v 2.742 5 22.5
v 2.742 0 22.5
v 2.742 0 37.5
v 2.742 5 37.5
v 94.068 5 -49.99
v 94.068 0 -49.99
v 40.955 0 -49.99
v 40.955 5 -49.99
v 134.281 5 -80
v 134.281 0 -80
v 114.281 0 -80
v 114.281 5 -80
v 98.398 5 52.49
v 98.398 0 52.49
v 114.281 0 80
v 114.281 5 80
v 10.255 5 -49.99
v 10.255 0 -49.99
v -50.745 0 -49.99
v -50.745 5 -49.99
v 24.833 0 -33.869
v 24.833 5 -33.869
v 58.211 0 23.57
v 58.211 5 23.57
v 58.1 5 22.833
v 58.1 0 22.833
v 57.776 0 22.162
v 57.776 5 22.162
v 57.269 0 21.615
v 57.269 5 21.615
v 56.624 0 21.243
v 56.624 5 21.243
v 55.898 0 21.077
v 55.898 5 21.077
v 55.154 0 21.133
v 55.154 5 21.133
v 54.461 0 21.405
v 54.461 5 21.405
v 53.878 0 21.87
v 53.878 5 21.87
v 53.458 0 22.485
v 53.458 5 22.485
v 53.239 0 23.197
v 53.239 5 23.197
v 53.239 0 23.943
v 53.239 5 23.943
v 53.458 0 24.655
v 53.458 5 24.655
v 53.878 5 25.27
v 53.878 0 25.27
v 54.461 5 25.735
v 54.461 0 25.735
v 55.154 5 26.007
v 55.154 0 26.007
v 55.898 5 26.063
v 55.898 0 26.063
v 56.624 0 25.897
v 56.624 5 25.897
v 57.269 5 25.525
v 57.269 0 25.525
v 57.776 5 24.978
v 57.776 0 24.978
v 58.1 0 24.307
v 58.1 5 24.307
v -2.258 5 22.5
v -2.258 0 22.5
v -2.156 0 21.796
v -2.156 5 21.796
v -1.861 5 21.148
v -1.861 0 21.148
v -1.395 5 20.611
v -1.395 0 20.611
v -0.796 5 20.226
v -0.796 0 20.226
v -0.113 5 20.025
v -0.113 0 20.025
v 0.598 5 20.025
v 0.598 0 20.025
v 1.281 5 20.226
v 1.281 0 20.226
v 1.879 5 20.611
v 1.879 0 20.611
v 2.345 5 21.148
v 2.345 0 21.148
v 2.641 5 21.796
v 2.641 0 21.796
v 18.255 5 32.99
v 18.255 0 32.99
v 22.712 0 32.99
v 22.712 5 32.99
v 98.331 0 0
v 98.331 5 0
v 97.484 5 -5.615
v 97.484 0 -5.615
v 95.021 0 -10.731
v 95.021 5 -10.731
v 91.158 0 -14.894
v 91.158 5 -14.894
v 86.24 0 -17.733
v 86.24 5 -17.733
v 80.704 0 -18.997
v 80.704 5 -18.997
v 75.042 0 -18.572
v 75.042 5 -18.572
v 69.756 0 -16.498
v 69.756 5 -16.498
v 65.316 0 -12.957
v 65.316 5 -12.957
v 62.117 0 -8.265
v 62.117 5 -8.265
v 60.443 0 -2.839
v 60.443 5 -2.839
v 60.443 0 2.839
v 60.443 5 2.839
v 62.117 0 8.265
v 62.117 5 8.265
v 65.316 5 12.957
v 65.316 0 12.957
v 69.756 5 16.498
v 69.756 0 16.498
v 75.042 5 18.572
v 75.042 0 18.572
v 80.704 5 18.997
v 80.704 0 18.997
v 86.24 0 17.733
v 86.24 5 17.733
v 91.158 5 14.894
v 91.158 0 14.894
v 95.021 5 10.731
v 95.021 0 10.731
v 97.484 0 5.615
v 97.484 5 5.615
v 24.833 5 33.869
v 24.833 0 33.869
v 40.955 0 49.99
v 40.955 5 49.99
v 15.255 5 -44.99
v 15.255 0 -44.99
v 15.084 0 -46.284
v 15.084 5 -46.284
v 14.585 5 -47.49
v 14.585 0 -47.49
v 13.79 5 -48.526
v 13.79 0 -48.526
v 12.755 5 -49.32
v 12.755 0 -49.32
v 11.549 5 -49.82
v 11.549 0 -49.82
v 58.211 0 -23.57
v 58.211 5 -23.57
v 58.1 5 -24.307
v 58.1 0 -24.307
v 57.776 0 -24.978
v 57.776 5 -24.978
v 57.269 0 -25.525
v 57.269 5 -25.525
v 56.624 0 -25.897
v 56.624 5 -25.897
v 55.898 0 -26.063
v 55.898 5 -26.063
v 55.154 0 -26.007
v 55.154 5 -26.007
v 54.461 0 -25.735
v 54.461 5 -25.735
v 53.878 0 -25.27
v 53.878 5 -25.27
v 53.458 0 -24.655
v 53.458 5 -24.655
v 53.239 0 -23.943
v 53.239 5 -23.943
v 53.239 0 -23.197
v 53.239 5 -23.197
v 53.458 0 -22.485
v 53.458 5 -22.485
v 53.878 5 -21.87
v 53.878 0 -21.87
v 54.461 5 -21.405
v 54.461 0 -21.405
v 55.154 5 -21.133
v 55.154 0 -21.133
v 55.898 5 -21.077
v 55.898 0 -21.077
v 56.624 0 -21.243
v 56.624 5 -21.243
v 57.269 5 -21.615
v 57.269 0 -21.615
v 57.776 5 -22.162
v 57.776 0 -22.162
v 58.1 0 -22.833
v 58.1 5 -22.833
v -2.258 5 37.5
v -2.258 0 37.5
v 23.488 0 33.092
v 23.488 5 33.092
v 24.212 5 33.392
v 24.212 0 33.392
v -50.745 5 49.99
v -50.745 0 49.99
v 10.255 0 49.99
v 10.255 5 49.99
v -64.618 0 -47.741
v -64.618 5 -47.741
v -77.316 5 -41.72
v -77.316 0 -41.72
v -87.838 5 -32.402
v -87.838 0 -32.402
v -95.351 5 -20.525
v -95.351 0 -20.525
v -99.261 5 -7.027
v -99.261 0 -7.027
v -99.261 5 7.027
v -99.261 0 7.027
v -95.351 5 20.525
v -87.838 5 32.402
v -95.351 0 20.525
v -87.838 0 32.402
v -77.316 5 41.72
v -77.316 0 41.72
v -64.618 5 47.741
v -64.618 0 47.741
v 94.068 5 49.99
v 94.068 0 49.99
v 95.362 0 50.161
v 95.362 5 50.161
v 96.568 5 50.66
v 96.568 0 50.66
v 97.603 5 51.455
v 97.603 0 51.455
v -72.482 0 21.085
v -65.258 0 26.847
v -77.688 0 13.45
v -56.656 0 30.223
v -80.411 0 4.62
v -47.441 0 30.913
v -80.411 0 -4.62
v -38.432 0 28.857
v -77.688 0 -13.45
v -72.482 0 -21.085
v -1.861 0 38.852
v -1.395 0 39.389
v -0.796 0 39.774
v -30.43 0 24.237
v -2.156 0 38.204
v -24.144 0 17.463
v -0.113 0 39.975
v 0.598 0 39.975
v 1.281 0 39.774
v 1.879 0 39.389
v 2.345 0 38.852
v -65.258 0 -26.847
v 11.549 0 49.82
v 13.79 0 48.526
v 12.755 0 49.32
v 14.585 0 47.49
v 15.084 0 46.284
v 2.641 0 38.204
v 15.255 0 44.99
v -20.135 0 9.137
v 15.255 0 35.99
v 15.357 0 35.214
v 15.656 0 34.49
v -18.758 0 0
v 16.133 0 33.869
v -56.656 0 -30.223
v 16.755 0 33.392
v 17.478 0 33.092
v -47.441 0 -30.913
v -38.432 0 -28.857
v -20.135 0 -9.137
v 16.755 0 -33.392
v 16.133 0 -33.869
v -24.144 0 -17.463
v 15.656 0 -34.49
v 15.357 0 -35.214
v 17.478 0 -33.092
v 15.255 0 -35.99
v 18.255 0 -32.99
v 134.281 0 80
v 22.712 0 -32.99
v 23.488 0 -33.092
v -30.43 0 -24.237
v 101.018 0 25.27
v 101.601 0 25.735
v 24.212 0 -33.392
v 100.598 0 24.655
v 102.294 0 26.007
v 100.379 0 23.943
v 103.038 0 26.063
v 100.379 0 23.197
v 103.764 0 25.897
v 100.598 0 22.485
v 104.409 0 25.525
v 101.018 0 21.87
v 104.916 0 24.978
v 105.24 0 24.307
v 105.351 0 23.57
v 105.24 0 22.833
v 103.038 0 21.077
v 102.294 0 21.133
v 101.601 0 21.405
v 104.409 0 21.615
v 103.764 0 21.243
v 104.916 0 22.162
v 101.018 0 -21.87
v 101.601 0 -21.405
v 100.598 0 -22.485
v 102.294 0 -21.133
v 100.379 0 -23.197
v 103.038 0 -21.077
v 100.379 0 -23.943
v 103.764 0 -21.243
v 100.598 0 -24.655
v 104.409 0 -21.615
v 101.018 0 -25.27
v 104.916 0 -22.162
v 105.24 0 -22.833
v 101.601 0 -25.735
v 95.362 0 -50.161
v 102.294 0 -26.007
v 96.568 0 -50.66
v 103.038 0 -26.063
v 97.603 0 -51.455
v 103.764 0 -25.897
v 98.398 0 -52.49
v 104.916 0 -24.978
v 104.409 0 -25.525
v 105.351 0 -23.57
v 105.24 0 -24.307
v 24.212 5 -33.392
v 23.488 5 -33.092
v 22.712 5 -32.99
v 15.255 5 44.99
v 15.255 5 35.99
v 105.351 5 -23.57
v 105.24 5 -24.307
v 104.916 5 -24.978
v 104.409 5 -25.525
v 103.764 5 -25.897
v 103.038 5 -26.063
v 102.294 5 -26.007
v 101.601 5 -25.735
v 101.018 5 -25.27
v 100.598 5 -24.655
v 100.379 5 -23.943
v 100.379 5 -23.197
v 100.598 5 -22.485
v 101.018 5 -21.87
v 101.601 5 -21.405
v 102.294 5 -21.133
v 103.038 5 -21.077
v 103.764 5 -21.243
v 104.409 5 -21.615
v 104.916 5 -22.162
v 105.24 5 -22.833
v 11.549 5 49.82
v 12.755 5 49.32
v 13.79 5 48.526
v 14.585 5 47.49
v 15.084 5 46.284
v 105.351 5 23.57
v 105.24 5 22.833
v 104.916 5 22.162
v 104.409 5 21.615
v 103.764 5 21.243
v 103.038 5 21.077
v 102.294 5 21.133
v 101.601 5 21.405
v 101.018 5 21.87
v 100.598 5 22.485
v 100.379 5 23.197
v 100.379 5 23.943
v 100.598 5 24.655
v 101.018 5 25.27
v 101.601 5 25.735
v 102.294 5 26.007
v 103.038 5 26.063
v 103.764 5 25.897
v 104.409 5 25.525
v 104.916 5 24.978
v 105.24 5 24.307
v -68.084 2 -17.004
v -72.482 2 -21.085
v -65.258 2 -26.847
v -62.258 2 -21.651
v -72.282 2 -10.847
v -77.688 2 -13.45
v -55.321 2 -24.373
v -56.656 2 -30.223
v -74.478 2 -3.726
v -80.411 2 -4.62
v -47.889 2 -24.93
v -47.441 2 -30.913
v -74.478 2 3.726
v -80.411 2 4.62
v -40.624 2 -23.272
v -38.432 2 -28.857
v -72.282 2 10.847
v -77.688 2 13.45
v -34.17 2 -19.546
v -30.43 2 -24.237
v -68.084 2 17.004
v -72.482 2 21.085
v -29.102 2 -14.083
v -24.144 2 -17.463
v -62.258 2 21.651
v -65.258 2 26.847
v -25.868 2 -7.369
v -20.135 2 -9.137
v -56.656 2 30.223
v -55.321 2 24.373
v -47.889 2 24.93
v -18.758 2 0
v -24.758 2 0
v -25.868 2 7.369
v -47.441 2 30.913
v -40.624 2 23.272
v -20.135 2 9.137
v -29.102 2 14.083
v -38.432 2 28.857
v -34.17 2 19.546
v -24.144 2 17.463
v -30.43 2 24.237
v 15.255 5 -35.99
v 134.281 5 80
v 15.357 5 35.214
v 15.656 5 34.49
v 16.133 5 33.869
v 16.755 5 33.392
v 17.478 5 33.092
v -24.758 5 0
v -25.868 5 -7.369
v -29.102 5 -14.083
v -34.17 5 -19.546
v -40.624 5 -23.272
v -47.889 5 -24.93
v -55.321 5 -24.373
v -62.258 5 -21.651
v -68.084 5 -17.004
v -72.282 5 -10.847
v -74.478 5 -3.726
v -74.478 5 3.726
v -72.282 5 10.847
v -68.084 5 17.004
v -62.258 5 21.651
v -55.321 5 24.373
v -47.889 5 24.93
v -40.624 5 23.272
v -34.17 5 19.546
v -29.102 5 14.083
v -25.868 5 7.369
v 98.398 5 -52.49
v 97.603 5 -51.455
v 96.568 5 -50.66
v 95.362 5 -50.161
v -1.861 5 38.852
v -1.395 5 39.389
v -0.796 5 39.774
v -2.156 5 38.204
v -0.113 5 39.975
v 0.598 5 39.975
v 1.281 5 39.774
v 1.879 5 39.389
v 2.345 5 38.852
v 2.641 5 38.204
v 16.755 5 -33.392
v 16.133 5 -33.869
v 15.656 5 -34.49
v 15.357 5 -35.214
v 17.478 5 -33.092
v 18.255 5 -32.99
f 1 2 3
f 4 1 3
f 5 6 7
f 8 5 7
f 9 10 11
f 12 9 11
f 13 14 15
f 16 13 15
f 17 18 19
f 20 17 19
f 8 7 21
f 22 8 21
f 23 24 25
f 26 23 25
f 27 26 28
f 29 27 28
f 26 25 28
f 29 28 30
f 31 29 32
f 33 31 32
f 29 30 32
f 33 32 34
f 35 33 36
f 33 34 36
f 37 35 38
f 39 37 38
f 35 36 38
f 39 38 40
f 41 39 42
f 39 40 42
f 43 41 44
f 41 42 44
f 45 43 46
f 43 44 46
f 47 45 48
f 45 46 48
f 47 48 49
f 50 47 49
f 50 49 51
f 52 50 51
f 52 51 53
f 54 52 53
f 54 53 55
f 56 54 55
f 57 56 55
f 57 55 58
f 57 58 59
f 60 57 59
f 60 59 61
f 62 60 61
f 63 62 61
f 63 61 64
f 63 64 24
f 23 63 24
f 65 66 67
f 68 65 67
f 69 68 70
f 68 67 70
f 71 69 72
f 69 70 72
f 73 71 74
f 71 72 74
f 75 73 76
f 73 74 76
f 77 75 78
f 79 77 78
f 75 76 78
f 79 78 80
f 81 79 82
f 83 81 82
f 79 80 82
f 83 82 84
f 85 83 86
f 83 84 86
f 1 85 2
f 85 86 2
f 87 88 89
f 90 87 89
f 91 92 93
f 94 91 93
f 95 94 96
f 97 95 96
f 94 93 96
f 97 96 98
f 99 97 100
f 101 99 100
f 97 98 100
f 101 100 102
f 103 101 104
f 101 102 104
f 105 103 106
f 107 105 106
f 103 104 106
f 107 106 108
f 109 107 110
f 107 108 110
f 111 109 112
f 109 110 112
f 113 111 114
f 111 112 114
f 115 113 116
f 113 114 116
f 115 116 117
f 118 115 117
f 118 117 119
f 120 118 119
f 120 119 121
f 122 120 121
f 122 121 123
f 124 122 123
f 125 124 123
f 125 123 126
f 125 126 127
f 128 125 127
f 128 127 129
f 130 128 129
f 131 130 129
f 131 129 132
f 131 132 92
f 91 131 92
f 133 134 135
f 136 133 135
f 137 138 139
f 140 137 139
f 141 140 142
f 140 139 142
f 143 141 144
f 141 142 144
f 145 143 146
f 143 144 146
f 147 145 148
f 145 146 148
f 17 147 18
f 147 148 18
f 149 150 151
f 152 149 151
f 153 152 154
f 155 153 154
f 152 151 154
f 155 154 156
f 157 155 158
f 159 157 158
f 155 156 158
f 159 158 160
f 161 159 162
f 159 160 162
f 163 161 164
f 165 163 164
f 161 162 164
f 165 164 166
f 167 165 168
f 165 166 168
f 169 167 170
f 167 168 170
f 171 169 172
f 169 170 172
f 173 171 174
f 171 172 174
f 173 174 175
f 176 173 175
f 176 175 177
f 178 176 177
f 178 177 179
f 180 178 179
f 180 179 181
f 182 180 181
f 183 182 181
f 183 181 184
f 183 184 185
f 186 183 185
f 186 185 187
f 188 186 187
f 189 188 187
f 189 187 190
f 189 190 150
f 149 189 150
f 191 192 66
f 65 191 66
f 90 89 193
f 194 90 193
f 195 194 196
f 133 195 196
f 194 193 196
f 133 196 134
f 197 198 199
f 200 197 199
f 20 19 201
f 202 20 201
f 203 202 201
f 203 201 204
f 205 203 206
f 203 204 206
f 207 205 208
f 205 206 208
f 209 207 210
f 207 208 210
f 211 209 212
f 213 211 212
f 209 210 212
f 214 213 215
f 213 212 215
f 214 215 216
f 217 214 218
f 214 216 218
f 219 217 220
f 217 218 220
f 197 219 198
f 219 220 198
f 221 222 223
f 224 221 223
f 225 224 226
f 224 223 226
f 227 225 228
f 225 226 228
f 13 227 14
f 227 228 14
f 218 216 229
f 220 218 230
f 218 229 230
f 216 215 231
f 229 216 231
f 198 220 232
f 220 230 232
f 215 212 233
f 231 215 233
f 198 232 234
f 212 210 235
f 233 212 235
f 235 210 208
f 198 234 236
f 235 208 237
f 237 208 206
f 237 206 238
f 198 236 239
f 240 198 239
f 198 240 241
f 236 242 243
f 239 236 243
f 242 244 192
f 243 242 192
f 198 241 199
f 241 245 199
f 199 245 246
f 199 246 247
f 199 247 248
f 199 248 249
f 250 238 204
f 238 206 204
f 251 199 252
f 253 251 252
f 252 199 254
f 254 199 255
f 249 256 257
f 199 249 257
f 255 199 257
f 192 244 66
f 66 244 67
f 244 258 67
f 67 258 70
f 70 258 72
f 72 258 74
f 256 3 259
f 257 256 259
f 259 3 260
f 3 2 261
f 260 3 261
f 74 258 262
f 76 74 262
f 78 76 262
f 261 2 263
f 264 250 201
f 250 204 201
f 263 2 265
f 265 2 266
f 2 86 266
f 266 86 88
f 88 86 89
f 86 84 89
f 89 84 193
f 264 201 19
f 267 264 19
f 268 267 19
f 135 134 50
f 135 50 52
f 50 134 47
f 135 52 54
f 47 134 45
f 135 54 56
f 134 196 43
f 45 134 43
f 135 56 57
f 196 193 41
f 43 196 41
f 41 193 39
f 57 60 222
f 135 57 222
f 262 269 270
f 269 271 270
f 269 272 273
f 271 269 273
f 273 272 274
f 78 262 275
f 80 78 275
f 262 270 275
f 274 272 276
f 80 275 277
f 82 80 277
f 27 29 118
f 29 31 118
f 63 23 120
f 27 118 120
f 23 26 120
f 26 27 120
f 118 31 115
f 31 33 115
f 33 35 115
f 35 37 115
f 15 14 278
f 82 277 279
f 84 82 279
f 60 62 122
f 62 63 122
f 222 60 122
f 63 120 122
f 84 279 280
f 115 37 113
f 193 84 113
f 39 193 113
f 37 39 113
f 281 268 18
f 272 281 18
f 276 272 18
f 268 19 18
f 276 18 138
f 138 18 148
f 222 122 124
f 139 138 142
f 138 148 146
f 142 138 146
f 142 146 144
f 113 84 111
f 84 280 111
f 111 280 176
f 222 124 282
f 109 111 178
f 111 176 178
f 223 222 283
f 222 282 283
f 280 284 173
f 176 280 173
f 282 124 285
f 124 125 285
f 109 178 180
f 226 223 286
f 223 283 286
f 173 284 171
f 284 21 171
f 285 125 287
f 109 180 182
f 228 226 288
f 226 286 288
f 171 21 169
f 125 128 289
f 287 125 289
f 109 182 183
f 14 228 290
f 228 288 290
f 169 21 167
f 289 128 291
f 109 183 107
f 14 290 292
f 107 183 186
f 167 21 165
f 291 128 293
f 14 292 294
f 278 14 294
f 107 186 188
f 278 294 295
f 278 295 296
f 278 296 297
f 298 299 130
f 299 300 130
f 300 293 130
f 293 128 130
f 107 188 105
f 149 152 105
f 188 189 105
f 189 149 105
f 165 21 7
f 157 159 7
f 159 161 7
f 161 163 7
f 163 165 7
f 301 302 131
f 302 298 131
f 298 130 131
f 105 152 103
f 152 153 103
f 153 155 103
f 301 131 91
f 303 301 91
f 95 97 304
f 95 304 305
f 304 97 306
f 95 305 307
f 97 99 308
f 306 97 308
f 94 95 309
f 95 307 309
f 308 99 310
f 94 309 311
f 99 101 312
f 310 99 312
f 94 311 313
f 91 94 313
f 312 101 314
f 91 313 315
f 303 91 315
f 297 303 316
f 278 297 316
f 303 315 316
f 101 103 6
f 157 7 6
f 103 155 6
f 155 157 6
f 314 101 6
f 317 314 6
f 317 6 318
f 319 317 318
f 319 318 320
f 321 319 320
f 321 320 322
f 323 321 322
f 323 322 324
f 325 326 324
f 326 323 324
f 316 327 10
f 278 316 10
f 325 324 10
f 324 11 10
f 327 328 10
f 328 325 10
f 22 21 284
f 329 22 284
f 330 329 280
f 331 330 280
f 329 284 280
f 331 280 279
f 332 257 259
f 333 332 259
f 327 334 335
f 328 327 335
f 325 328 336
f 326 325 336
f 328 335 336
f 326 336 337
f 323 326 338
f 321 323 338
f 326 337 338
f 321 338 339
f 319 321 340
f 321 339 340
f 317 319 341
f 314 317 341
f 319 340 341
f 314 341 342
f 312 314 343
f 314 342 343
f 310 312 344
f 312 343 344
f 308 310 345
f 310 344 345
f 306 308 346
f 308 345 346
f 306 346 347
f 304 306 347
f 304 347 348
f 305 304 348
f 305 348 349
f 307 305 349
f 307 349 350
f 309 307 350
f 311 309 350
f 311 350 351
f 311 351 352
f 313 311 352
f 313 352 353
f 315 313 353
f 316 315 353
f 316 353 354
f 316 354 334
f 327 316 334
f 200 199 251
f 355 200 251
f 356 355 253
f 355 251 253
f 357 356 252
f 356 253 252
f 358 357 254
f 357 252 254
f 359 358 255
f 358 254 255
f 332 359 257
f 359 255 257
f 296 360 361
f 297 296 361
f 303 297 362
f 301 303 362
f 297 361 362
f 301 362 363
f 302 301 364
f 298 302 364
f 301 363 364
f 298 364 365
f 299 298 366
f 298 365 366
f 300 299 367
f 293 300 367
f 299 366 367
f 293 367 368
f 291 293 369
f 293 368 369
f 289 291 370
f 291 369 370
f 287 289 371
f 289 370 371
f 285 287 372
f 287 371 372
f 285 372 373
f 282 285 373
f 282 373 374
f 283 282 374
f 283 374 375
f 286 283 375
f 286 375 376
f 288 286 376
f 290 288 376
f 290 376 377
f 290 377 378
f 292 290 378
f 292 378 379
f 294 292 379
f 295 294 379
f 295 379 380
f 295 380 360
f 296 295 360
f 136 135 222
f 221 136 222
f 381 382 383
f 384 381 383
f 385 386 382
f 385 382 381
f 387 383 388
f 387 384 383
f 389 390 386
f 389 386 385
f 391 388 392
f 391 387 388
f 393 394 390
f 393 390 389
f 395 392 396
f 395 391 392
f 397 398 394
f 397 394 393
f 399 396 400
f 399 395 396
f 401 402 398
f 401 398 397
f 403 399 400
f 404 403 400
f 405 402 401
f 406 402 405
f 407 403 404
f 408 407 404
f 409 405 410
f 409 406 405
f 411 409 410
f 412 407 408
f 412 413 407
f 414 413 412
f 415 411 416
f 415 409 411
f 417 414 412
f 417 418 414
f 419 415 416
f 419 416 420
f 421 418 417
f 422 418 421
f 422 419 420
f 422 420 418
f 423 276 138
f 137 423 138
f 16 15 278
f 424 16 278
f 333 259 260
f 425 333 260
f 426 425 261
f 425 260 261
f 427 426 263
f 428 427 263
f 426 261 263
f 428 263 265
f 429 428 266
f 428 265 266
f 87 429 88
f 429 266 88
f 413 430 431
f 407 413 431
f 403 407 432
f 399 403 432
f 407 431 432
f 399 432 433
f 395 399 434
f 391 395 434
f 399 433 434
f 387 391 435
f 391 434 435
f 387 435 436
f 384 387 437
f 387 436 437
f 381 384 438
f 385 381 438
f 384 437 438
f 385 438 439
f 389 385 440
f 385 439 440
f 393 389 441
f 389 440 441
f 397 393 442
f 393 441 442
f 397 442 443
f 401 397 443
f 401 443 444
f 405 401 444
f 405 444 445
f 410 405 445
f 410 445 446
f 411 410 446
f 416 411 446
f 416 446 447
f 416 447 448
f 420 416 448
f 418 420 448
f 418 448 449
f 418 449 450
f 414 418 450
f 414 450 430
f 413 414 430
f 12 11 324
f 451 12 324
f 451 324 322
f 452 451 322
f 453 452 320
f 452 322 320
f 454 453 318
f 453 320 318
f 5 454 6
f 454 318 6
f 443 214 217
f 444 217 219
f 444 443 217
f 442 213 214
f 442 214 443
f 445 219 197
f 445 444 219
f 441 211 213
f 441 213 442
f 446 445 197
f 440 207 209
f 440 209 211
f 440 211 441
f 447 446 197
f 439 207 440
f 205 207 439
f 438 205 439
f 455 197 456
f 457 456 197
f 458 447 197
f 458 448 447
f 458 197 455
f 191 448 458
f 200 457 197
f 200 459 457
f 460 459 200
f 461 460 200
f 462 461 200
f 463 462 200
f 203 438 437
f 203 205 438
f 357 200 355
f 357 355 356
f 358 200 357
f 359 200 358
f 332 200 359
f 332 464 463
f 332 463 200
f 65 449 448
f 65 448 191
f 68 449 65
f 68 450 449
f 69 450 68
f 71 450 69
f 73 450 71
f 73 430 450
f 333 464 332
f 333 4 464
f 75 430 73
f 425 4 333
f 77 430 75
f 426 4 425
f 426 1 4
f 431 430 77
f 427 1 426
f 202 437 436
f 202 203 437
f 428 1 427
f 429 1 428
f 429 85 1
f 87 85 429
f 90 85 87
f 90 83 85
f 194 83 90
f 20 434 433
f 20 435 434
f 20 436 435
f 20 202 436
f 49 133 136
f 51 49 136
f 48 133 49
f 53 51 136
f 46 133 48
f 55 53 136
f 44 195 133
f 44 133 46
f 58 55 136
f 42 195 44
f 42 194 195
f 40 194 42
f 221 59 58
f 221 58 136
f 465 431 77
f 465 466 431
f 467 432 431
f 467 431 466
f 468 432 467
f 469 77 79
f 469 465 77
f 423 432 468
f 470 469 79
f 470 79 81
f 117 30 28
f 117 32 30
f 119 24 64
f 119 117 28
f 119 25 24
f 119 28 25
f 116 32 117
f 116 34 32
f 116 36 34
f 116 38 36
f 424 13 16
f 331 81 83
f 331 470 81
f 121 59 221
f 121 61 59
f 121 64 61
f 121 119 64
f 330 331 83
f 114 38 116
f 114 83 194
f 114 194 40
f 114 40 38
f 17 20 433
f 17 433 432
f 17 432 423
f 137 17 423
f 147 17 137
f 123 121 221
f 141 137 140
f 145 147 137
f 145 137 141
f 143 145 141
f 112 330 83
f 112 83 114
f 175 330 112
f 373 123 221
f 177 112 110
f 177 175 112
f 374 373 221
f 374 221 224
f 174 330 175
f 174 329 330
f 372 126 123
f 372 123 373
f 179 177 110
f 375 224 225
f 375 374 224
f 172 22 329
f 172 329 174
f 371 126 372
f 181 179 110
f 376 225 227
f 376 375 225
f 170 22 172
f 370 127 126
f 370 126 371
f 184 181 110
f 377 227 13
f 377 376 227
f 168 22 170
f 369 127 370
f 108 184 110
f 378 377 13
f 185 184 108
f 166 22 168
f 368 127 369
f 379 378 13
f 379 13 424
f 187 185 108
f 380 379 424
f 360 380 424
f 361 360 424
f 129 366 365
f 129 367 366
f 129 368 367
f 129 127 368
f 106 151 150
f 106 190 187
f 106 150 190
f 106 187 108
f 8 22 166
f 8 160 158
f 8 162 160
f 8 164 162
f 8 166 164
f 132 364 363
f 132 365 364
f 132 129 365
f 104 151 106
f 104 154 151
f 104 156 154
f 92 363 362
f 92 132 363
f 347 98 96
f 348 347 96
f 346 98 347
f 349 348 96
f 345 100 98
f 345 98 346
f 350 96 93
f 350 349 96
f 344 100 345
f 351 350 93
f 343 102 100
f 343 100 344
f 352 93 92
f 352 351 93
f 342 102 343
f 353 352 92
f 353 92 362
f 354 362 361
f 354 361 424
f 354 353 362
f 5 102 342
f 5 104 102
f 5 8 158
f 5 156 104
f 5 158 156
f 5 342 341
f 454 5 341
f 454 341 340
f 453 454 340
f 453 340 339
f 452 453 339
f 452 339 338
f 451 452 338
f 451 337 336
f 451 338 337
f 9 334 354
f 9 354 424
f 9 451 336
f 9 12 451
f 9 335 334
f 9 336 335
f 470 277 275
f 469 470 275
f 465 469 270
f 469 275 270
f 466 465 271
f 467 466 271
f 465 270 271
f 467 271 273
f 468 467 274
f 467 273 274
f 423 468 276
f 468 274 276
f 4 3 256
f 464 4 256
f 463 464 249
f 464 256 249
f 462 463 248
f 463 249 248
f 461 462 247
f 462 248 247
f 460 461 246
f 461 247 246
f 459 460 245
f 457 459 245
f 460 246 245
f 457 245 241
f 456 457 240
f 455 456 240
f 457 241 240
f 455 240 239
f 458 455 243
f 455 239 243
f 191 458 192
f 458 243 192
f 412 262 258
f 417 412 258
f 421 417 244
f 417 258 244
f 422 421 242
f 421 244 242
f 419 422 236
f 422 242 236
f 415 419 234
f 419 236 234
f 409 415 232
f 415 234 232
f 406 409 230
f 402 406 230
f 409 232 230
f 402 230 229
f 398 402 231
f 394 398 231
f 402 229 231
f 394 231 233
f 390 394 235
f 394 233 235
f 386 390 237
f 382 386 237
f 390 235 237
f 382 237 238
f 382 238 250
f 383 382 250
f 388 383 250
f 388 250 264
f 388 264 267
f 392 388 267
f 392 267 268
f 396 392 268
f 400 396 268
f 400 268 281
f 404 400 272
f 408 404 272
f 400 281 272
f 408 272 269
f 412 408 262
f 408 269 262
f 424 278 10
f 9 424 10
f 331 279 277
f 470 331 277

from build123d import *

# Parameters (mm, degrees)
BOSS_EXTRUDE1_DEPTH = 5
SKETCH10_R          = 19.05
SKETCH10_R_2        = 2.5
SKETCH10_R_3        = 25
CUT_EXTRUDE7_DEPTH  = 6
SKETCH11_R          = 31
CUT_EXTRUDE8_DEPTH  = 2
CUT_EXTRUDE9_DEPTH  = 6


with BuildPart() as part:
    # Sketch1 → Boss-Extrude1 (new body)
    with BuildSketch(Plane(origin=(0, 0, 0), x_dir=(1, 0, 0), z_dir=(0, 1, 0))):
        with BuildLine():
            Line((15.254575611, 35.990242765), (15.254575611, 44.990242765))
            ThreePointArc((15.254575611, 44.990242765), (13.790109517, 48.525776671), (10.254575611, 49.990242765))
            Line((10.254575611, 49.990242765), (-50.745424389, 49.990242765))
            ThreePointArc((-50.745424389, 49.990242765), (-99.757685432, 0), (-50.745424389, -49.990242765))
            Line((-50.745424389, -49.990242765), (10.254575611, -49.990242765))
            ThreePointArc((10.254575611, -49.990242765), (13.790109517, -48.525776671), (15.254575611, -44.990242765))
            Line((15.254575611, -44.990242765), (15.254575611, -35.990242765))
            ThreePointArc((15.254575611, -35.990242765), (16.133255268, -33.868922422), (18.254575611, -32.990242765))
            Line((18.254575611, -32.990242765), (22.711934924, -32.990242765))
            ThreePointArc((22.711934924, -32.990242765), (23.859985221, -33.218604168), (24.833255268, -33.868922422))
            Line((24.833255268, -33.868922422), (40.954575611, -49.990242765))
            Line((40.954575611, -49.990242765), (50.745424389, -49.990242765))
            Line((50.745424389, -49.990242765), (94.067824265, -49.990242765))
            ThreePointArc((94.067824265, -49.990242765), (96.567824265, -50.660115747), (98.397951284, -52.490242765))
            Line((98.397951284, -52.490242765), (114.280717029, -80))
            Line((114.280717029, -80), (134.280717029, -80))
            Line((134.280717029, -80), (134.280717029, 80))
            Line((134.280717029, 80), (114.280717029, 80))
            Line((114.280717029, 80), (98.397951284, 52.490242765))
            ThreePointArc((98.397951284, 52.490242765), (96.567824265, 50.660115747), (94.067824265, 49.990242765))
            Line((94.067824265, 49.990242765), (50.745424389, 49.990242765))
            Line((50.745424389, 49.990242765), (40.954575611, 49.990242765))
            Line((40.954575611, 49.990242765), (24.833255268, 33.868922422))
            ThreePointArc((24.833255268, 33.868922422), (23.859985221, 33.218604168), (22.711934924, 32.990242765))
            Line((22.711934924, 32.990242765), (18.254575611, 32.990242765))
            ThreePointArc((18.254575611, 32.990242765), (16.133255268, 33.868922422), (15.254575611, 35.990242765))
        make_face()
    extrude(amount=BOSS_EXTRUDE1_DEPTH)

    # Sketch10 → Cut-Extrude7 (cut, through all)
    with BuildSketch(Plane(origin=(0, 5, 0), x_dir=(1, 0, 0), z_dir=(0, 1, 0))):
        with Locations((79.280717029, 0)):
            Circle(SKETCH10_R)
        with Locations((55.710717029, 23.57)):
            Circle(SKETCH10_R_2)
        with Locations((102.850717029, 23.57)):
            Circle(SKETCH10_R_2)
        with Locations((102.850717029, -23.57)):
            Circle(SKETCH10_R_2)
        with Locations((55.710717029, -23.57)):
            Circle(SKETCH10_R_2)
        with Locations((-49.757685432, 0)):
            Circle(SKETCH10_R_3)
    extrude(amount=-CUT_EXTRUDE7_DEPTH, mode=Mode.SUBTRACT)

    # Sketch11 → Cut-Extrude8 (cut)
    with BuildSketch(Plane.XZ):
        with Locations((-49.757685432, 0)):
            Circle(SKETCH11_R)
    extrude(amount=-CUT_EXTRUDE8_DEPTH, mode=Mode.SUBTRACT)

    # Sketch12 → Cut-Extrude9 (cut, through all)
    with BuildSketch(Plane.XZ):
        with BuildLine():
            Line((-2.257685432, 37.5), (-2.257685432, 22.5))
            ThreePointArc((-2.257685432, 22.5), (0.242314568, 20), (2.742314568, 22.5))
            Line((2.742314568, 22.5), (2.742314568, 37.5))
            ThreePointArc((2.742314568, 37.5), (0.242314568, 40), (-2.257685432, 37.5))
        make_face()
    extrude(amount=-CUT_EXTRUDE9_DEPTH, mode=Mode.SUBTRACT)


solid = part.part
